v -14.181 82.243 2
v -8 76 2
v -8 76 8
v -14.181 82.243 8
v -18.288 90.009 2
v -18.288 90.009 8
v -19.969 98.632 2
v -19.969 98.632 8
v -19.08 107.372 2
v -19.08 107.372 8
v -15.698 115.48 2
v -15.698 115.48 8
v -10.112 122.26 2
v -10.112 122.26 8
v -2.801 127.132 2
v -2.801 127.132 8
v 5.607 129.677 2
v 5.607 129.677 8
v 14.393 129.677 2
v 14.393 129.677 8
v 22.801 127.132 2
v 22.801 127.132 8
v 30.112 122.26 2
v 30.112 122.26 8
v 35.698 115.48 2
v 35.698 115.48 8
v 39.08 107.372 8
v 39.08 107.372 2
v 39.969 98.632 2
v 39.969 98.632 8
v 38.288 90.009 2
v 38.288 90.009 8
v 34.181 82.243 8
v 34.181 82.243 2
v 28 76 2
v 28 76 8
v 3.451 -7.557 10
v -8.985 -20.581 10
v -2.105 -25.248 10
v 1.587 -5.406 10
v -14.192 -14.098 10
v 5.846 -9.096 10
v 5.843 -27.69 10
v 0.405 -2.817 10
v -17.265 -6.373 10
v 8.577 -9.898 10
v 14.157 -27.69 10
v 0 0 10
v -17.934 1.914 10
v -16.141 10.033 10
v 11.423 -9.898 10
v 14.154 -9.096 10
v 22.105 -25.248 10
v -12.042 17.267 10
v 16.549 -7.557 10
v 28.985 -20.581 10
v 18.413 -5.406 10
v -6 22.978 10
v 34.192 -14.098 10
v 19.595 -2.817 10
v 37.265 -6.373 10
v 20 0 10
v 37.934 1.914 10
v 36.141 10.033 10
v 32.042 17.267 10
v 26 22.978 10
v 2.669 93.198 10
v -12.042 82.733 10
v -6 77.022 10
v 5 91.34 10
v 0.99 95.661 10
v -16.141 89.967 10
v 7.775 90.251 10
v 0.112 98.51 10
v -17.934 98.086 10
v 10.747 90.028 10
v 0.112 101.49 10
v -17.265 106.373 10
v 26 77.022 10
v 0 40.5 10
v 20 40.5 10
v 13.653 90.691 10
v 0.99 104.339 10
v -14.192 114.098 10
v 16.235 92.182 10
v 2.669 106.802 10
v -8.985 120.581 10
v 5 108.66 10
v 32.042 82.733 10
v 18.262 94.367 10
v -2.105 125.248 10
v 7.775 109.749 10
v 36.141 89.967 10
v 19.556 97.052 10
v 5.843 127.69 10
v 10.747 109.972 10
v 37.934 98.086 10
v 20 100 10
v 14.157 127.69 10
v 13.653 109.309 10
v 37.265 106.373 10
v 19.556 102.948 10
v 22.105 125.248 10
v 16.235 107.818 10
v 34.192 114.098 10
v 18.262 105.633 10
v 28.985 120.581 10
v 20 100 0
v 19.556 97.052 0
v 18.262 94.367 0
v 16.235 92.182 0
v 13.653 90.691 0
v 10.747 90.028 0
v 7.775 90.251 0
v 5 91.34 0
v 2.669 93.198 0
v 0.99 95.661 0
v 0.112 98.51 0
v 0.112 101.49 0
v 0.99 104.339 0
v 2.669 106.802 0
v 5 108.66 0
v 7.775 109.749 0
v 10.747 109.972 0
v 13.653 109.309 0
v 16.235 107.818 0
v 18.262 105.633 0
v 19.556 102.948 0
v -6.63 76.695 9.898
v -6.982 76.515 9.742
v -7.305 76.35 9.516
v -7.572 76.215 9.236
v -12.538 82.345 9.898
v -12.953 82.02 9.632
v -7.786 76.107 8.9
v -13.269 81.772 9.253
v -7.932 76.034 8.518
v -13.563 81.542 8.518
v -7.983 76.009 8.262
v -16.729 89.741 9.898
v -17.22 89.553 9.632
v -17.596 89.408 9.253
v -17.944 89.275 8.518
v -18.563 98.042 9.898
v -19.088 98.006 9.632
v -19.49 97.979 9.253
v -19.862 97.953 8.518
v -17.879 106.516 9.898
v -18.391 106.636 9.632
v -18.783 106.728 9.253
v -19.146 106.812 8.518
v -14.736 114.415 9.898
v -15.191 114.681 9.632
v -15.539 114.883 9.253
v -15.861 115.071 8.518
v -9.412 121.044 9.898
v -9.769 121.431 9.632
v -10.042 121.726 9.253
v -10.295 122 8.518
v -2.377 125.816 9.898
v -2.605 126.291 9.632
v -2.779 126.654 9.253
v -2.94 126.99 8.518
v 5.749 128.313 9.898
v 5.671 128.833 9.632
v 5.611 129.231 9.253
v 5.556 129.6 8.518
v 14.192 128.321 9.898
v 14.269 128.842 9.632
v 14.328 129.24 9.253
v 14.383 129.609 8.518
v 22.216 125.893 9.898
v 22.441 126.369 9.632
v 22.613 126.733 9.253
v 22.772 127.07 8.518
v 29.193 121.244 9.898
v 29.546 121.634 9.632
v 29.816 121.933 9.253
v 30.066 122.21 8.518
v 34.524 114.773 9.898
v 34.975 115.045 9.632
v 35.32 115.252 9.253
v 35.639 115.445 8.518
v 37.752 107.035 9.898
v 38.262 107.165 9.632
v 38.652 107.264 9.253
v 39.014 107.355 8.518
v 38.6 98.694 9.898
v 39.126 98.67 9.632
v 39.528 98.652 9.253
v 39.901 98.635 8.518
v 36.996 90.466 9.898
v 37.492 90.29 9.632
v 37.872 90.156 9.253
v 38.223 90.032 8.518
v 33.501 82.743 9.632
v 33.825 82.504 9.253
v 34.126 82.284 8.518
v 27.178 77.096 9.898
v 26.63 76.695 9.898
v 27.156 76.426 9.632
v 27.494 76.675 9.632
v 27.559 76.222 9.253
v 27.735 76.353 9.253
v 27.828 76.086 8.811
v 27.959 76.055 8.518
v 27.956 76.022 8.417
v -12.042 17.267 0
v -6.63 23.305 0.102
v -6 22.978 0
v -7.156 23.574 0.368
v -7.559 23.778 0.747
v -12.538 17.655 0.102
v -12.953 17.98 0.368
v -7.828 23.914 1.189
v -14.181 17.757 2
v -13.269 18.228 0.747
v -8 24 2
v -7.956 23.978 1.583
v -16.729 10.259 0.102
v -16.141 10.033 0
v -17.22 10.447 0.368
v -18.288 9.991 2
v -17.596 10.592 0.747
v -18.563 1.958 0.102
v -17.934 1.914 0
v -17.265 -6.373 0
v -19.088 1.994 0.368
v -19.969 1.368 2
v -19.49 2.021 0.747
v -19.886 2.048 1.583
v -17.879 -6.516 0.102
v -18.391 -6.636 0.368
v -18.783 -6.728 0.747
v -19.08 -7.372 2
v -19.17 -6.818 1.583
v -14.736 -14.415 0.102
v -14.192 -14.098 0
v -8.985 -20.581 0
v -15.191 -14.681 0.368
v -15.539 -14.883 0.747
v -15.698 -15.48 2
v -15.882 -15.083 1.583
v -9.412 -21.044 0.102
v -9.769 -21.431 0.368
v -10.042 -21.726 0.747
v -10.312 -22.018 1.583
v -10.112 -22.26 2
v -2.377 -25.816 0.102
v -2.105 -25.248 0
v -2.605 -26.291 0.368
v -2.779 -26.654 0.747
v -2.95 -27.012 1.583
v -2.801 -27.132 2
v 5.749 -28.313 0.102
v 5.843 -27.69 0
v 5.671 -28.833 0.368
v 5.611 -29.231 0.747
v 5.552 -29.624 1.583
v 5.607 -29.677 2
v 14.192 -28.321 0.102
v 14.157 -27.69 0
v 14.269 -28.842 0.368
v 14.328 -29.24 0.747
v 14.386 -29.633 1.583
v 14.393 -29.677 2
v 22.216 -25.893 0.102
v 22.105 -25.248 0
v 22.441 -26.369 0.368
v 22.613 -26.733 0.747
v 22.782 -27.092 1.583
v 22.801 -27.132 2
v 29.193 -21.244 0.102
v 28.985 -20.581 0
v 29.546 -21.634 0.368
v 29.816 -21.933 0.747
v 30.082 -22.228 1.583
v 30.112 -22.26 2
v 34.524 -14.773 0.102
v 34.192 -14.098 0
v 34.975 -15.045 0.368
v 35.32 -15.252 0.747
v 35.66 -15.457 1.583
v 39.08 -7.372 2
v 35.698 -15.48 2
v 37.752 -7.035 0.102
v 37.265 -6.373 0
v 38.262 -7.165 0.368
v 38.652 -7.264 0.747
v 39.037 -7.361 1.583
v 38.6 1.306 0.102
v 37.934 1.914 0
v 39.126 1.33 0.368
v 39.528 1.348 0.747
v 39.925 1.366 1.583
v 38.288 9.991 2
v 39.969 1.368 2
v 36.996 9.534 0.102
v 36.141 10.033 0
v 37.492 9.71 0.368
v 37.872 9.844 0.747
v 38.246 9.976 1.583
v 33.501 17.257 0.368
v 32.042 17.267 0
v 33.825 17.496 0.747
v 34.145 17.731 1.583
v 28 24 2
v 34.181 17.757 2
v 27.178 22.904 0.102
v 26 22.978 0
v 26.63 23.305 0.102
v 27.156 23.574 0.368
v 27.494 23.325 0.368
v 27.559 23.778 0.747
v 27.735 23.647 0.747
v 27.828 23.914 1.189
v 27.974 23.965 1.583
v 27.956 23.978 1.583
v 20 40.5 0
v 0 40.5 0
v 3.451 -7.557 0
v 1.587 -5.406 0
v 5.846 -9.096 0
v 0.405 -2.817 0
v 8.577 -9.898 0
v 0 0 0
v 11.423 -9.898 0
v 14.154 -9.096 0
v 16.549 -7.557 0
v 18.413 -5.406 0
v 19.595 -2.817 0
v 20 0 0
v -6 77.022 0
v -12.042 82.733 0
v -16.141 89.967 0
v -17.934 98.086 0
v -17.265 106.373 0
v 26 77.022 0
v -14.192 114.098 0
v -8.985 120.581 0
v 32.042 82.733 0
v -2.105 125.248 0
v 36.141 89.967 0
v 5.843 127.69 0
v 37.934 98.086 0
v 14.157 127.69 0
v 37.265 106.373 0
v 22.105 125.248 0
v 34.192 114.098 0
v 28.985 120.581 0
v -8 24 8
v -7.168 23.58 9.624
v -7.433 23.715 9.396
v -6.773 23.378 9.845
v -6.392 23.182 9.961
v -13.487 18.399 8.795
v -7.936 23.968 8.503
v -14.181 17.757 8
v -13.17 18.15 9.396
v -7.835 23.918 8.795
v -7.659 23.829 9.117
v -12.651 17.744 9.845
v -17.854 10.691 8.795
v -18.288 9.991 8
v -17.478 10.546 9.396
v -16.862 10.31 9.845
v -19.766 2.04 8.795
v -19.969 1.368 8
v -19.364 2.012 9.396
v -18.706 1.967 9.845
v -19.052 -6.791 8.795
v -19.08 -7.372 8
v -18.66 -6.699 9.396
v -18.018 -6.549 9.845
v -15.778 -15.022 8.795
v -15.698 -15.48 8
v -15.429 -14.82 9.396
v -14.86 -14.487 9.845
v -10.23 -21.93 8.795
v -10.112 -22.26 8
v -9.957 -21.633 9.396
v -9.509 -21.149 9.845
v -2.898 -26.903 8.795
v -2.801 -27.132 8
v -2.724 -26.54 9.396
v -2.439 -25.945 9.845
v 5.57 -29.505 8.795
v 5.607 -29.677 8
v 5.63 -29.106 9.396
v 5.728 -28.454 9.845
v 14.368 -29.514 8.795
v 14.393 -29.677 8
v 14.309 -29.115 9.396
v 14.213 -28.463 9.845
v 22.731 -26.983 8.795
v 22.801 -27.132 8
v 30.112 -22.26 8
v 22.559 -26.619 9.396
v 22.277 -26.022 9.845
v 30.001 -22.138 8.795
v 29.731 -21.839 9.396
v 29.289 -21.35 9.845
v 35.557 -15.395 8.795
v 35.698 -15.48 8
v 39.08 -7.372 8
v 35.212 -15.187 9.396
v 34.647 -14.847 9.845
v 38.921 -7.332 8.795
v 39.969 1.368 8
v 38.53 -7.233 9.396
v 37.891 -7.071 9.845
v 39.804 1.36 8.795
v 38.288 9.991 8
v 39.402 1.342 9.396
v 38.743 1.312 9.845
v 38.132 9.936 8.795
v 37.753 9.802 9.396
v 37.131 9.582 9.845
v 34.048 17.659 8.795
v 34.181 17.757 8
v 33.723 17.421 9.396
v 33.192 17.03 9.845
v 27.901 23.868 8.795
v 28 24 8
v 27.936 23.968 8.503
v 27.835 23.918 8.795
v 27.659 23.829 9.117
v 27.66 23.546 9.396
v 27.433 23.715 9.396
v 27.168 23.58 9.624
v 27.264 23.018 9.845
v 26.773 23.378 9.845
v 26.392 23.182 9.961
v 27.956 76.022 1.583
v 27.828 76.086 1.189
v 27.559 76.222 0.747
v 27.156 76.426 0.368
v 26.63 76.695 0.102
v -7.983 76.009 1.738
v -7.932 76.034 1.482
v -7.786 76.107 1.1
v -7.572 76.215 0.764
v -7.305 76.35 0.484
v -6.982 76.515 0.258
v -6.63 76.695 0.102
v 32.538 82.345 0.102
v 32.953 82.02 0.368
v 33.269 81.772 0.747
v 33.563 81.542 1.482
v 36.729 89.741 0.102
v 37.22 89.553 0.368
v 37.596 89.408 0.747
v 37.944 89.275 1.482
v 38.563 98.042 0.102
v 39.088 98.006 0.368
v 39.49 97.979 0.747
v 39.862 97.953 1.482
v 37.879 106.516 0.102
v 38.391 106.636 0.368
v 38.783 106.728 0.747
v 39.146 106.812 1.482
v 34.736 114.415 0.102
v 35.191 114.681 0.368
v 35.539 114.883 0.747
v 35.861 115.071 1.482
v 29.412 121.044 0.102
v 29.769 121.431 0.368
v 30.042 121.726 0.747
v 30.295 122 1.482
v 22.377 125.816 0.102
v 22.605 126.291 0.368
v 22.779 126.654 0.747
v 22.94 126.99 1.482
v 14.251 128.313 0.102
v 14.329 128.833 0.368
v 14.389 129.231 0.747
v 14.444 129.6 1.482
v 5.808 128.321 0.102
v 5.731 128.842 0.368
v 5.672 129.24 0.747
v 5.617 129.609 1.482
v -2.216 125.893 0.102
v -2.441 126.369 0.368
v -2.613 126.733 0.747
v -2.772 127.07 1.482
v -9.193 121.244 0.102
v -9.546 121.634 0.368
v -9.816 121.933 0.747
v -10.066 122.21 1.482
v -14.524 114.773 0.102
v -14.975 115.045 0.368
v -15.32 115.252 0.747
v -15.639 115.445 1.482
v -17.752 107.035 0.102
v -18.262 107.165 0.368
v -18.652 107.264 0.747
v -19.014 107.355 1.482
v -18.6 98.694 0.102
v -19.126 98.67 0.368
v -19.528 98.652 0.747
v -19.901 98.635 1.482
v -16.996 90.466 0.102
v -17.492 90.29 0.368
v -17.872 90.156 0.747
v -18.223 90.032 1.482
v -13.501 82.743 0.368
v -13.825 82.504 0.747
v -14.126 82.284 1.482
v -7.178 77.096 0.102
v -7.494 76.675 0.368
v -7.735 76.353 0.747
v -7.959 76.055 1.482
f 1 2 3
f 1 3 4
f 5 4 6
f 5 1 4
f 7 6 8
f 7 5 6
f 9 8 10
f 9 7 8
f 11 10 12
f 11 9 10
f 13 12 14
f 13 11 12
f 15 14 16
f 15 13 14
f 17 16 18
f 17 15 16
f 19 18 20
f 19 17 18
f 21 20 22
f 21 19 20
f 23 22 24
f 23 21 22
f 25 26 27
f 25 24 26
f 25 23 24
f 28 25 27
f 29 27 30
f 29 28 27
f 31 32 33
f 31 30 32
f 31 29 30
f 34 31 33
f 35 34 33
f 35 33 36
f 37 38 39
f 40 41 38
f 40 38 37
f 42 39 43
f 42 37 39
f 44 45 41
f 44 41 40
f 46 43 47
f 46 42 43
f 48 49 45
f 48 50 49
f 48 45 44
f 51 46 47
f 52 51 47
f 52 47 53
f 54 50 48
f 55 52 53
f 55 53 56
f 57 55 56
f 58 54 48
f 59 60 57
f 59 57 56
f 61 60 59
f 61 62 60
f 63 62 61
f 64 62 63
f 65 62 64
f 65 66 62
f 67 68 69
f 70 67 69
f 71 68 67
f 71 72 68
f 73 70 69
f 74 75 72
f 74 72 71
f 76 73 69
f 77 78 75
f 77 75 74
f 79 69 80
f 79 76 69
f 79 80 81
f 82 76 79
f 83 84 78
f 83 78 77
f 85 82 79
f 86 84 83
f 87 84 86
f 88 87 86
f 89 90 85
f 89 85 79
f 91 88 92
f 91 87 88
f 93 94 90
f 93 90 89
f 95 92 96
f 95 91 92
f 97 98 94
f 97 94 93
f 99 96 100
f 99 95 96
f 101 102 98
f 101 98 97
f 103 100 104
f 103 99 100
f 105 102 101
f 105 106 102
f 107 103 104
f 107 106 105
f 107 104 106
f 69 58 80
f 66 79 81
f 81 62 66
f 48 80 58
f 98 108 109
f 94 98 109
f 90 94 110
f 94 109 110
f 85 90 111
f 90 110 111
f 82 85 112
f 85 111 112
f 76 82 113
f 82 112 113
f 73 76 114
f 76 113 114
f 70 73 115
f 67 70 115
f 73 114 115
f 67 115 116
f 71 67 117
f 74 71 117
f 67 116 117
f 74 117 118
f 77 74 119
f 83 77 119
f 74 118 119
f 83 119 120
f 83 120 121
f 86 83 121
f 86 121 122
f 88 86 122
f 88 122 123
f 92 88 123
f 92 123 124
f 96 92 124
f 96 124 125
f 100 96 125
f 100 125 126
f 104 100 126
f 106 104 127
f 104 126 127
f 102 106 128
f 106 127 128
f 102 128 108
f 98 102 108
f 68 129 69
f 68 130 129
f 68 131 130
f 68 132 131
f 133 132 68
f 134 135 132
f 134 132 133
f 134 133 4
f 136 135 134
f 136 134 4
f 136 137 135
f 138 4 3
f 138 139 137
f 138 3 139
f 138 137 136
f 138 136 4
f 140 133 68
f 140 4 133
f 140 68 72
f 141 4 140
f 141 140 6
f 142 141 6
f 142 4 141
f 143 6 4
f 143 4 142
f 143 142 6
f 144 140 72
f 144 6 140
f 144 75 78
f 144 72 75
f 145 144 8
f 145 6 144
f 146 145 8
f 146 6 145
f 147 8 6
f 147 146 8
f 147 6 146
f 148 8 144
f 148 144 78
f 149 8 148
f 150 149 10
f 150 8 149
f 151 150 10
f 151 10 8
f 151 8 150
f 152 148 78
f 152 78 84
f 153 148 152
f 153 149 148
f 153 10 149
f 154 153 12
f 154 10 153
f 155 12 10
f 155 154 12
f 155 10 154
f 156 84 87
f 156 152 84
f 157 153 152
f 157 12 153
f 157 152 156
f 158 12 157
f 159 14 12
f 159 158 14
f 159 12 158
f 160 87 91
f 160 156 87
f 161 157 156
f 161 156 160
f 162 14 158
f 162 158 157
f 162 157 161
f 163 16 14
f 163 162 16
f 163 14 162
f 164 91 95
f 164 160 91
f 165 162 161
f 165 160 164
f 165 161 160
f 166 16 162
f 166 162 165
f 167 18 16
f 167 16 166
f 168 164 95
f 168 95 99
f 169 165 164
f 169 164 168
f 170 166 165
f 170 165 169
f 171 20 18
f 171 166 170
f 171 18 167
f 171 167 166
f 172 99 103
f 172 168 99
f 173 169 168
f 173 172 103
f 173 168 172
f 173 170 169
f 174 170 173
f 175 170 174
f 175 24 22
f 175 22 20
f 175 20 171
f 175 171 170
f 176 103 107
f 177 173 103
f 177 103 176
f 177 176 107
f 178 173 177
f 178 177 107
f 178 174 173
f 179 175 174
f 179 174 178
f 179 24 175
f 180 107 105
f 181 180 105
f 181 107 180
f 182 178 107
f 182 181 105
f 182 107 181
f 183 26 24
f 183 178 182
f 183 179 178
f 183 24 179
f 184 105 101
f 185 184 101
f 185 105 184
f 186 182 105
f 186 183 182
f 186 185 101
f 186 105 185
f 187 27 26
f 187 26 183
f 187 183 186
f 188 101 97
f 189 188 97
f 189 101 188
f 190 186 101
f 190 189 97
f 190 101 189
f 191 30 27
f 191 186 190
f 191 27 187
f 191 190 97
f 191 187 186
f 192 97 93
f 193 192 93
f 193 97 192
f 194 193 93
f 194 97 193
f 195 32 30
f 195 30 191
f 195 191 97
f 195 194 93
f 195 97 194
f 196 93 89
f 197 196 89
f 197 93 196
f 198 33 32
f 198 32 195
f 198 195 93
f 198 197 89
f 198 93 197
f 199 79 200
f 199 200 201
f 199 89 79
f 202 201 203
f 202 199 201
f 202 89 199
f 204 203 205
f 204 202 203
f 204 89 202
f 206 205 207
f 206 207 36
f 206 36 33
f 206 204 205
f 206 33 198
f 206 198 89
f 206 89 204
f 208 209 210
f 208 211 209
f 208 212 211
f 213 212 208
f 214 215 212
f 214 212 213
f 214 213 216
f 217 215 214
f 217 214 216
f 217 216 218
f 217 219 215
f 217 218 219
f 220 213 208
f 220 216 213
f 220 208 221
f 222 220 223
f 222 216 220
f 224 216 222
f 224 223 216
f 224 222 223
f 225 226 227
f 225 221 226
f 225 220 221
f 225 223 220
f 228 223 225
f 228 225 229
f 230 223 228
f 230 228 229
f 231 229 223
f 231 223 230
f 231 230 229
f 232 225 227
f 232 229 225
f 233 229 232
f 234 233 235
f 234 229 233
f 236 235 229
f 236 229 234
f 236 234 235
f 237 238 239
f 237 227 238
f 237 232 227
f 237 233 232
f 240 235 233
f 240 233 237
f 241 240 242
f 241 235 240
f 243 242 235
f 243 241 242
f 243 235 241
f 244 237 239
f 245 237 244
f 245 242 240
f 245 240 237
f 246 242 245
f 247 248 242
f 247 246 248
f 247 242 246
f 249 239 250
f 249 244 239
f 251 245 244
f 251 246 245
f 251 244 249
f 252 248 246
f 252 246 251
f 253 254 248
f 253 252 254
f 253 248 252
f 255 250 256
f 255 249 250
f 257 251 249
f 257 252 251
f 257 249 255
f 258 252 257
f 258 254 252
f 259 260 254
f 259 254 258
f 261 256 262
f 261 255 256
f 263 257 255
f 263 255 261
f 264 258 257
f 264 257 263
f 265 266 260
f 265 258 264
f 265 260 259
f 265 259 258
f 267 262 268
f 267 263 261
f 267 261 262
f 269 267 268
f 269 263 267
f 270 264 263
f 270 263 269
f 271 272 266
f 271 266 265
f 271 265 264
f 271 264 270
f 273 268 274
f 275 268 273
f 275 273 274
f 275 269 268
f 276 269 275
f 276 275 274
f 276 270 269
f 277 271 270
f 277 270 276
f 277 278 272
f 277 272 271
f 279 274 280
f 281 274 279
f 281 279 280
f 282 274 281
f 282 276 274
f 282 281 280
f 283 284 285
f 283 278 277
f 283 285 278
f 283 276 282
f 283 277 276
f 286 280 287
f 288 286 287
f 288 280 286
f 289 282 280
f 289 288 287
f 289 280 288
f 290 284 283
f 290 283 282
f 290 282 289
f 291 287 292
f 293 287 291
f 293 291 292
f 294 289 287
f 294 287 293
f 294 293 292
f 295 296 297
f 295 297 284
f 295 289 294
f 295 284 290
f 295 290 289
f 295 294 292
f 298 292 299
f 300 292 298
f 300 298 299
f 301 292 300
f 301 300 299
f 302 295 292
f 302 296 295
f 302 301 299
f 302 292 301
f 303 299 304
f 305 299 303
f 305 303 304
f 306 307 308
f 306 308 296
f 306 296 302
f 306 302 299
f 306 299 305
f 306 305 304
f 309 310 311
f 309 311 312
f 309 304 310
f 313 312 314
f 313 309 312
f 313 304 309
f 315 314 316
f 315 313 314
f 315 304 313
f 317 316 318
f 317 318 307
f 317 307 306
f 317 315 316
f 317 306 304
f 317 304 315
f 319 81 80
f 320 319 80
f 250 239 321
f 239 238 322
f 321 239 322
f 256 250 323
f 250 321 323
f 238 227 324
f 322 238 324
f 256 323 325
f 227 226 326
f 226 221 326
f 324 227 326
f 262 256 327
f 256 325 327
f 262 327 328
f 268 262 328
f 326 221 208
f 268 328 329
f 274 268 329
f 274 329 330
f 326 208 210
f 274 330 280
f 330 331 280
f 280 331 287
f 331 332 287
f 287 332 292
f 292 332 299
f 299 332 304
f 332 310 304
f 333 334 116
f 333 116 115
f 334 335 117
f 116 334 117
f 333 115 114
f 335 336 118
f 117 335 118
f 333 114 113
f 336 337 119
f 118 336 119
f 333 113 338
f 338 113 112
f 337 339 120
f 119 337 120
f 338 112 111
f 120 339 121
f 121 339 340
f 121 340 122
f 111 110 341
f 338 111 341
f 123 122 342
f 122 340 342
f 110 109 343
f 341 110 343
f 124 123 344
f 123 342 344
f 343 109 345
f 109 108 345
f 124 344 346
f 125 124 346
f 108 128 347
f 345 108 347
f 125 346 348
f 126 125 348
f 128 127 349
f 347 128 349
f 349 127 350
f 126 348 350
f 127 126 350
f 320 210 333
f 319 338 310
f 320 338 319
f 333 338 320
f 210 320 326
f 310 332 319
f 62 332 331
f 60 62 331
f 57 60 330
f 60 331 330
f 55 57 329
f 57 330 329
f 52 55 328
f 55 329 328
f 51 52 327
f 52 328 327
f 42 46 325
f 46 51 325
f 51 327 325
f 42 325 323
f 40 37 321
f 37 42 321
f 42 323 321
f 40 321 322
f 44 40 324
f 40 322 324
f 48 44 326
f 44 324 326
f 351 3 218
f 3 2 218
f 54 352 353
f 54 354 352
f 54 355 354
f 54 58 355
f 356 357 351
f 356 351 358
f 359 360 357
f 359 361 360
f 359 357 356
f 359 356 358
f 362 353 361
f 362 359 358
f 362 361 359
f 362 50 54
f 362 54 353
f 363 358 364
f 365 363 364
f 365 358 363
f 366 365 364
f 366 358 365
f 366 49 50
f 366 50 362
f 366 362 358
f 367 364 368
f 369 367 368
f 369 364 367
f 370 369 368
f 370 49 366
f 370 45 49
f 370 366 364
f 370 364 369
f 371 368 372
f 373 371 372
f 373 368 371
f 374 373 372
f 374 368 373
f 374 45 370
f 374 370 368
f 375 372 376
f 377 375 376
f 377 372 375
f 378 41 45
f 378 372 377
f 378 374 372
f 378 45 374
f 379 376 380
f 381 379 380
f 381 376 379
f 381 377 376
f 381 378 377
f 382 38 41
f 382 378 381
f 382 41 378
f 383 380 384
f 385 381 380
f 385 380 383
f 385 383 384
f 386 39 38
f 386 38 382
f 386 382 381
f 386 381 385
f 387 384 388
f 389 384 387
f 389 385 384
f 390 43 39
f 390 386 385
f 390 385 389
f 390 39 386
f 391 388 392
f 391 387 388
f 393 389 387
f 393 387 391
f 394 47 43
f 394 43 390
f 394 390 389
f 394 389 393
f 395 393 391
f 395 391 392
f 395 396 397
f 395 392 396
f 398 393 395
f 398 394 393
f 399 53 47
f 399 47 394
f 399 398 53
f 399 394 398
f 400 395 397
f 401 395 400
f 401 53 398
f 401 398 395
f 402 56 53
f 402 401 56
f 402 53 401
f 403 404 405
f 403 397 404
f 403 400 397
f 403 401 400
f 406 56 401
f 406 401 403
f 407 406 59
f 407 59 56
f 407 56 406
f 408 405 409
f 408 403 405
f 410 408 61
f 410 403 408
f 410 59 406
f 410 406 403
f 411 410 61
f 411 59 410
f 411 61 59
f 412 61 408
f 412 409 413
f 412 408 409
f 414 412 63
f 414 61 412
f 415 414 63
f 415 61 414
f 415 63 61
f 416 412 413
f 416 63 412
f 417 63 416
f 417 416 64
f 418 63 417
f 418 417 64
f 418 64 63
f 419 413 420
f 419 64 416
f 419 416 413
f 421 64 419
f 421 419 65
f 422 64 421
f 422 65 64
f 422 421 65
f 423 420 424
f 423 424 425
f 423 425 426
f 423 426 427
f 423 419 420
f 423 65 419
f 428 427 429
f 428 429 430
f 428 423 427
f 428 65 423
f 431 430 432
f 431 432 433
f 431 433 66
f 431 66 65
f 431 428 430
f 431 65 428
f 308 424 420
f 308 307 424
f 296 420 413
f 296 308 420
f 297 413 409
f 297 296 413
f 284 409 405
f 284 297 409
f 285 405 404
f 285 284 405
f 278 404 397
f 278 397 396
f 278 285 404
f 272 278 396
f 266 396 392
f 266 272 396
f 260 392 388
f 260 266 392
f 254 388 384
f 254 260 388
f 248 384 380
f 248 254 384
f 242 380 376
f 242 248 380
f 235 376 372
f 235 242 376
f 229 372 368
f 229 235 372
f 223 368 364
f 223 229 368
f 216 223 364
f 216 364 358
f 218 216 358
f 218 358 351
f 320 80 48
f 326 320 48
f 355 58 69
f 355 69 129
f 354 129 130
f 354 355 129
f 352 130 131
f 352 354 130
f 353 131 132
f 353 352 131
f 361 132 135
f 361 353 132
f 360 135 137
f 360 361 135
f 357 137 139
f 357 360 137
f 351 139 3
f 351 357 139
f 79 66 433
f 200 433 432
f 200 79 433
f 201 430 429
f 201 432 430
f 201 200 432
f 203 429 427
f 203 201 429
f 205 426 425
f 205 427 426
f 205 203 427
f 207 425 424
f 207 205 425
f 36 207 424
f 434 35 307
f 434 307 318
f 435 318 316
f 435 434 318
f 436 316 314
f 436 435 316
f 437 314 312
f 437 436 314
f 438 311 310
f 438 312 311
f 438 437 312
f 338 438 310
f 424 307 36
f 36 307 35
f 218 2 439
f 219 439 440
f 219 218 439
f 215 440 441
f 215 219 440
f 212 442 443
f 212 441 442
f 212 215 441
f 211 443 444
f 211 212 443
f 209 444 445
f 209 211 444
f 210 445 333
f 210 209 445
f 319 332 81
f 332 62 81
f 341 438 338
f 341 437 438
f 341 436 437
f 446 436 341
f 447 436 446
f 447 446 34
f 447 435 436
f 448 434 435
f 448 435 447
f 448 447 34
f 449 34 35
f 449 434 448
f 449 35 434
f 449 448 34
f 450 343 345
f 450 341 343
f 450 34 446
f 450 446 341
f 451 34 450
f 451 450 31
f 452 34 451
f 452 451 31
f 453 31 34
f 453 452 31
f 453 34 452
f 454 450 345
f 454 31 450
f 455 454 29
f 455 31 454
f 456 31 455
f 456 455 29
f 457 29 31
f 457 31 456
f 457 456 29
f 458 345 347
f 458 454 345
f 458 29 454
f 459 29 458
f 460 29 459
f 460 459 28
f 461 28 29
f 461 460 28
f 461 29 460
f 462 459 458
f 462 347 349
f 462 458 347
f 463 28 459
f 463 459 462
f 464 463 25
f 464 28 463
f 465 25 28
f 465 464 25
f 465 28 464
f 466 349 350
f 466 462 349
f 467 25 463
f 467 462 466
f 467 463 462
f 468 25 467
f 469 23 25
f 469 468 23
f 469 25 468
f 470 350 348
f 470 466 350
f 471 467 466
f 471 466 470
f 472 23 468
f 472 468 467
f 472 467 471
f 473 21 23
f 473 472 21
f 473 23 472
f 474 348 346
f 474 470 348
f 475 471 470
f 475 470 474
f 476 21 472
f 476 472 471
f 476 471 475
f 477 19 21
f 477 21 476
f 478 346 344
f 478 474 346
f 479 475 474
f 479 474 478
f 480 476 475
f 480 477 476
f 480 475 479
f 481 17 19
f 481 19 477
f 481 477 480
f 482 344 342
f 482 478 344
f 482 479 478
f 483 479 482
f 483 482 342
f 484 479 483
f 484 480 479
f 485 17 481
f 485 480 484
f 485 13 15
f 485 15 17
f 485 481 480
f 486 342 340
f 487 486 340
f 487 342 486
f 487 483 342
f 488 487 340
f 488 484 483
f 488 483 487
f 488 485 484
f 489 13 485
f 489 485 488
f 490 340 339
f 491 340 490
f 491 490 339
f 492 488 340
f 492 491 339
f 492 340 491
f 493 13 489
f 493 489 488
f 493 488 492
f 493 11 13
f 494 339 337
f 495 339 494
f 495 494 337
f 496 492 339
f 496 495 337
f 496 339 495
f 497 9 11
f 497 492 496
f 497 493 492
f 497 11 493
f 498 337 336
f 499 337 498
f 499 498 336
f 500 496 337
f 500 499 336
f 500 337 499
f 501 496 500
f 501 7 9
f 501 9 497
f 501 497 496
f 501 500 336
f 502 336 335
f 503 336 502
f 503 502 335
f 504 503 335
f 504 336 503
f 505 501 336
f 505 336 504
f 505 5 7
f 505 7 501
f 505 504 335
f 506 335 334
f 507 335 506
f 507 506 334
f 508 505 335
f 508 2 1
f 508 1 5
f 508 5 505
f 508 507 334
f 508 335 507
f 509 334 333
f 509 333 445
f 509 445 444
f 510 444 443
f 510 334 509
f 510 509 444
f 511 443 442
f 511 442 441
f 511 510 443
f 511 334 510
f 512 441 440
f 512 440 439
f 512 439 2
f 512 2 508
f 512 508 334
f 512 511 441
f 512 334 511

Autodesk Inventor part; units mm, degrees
ref_plane "YZ Plane" through (0, 0, 0) normal (1, 0, 0) x (0, 1, 0)
ref_plane "XZ Plane" through (0, 0, 0) normal (0, 1, 0) x (-1, 0, 0)
ref_plane "XY Plane" through (0, 0, 0) normal (0, 0, 1) x (1, 0, 0)
sketch "Sketch1" plane through (0, 0, 0) normal (0, 0, 1) x (1, 0, 0)
  line L0 (0, 0) -> (20, 0)
  line L1 (20, 0) -> (20, 40.5)
  line L2 (20, 40.5) -> (0, 40.5)
  line L3 (0, 40.5) -> (0, 0)
  circle A0 centre (10, 0) radius 30
  circle A1 centre (10, 0) radius 10
  line L4 (-8, 0) -> (28, 0)
  line L5 (28, 0) -> (28, 100)
  line L6 (28, 100) -> (-8, 100)
  line L7 (-8, 100) -> (-8, 0)
  circle A2 centre (10, 100) radius 30
  circle A3 centre (10, 100) radius 10
  point P0 (28, 24)
  point P1 (28, 76)
  point P2 (-8, 76)
  point P3 (-8, 24)
  dimension "d2" = 20
  dimension "d3" = 40.5
  dimension "d4" = 60
  dimension "d5" = 20
  dimension "d6" = 36
  dimension "d7" = 100
  dimension "d8" = 60
  dimension "d9" = 20
extrude "Extrusion1" add sketch "Sketch1" along normal blind 10 contours L4 L7 A0 L3 | L3 A0 L1 A1 | A1 L4 L5 A0 L7 | L1 A0 L5 L4 | A0 L7 A2 L5 L1 L2 L3 | L3 L2 L1 A0 | A2 L5 L6 A3 L7 | L7 L6 A3 L5 A2
fillet "Fillet1" radius 2 8 edges at (10, 130, 10) (28, 50, 10) (-8, 50, 10) (10, -30, 10) (10, 130, 0) (28, 50, 0) (10, -30, 0) (-8, 50, 0)
sketch "Sketch2" plane through (0, 0, 10) normal (0, 0, 1) x (1, 0, 0)
  line L0 (0, 0) -> (20, 0)
  line L1 (20, 0) -> (20, 40.5)
  line L2 (20, 40.5) -> (0, 40.5)
  line L3 (0, 40.5) -> (0, 0)
  dimension "d13" = 20
  dimension "d14" = 40.5
extrude "Extrusion2" cut sketch "Sketch2" against normal blind 10.6375
properties part number "2nd arm"
